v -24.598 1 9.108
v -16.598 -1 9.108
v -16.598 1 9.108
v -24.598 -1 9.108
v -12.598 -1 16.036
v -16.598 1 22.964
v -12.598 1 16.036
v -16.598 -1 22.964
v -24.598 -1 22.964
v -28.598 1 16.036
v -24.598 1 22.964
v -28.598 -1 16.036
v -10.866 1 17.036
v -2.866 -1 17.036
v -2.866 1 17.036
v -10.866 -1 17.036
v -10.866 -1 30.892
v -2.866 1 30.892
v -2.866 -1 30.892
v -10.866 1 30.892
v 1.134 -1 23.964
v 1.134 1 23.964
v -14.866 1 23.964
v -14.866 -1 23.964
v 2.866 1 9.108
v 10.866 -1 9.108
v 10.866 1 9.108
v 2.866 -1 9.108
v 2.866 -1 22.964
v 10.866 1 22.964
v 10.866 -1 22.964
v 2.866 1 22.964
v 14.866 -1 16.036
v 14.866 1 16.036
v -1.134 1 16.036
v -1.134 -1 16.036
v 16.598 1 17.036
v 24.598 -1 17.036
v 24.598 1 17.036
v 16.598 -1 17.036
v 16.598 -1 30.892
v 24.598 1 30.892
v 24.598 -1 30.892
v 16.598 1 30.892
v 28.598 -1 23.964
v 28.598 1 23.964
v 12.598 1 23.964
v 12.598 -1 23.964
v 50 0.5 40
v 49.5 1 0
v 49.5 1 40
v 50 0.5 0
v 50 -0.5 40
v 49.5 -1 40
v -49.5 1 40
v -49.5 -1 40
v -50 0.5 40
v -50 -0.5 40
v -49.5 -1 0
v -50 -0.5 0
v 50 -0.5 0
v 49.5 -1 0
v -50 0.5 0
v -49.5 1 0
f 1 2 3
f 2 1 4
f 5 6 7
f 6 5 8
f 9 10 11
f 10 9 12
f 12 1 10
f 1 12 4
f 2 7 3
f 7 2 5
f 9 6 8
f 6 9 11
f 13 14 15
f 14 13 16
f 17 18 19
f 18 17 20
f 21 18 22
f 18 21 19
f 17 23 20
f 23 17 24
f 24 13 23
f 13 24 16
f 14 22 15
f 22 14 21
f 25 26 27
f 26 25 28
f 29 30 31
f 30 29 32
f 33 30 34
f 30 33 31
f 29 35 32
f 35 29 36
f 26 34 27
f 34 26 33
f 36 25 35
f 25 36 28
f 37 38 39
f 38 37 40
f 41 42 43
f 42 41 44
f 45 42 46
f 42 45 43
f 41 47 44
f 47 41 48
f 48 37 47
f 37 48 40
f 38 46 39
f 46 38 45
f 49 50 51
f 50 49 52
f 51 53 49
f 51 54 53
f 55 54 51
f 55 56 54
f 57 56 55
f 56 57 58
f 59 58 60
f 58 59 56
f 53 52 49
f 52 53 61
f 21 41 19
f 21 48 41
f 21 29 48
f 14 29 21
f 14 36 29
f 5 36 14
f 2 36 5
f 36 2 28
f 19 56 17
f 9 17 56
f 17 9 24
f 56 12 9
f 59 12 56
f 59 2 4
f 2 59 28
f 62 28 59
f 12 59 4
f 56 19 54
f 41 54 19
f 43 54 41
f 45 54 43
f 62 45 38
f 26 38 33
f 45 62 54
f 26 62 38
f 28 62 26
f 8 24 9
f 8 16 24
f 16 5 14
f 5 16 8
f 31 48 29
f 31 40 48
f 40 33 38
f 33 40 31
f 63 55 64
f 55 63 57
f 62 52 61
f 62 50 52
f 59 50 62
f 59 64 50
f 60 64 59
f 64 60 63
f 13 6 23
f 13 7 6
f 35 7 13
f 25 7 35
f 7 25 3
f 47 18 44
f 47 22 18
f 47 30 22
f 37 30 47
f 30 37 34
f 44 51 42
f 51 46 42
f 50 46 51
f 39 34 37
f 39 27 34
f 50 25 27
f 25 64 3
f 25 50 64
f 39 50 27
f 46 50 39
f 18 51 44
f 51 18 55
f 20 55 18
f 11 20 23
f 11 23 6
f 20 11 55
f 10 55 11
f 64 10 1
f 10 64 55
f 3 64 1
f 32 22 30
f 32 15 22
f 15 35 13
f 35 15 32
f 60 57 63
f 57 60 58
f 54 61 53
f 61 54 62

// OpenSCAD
// Deutsche Version – automatisch erzeugt aus scad/wall.scad
// The Drawer Dividers V3 – Wall
// Divider walls with optional hex/circle pattern and finger grip.

/* [Bauteil] */
// Länge (mm) – der Designer sagt dir, welche Längen du brauchst
Laenge = 100; // [20:0.1:400]
// Wandhöhe (mm, 0 = automatisch aus der Verbinderhöhe)
Wand_Hoehe = 0; // [0:0.1:150]
// Wand für Aufsteck-Verbinder? (wird um die Bodendicke niedriger)
Fuer_Aufsteck = false;
// Wie viele Teile auf dem Druckbett
Anzahl = 1; // [1:1:40]
// Abstand zwischen den Teilen (mm)
Abstand = 5; // [2:1:20]
// Ausrichtung auf dem Druckbett
Ausrichtung = "standing"; // [standing:Standing (strong, fast), flat:Flat (best with patterns)]

/* [Gestaltung] */
// Muster zur Materialersparnis
Muster = "hex"; // [none:Keins, hex:Waben, circle:Kreise]
// Größe einer Zelle (Radius, mm)
Zellen_Groesse = 8; // [2:0.5:30]
// Steg zwischen zwei Zellen (mm)
Steg_Dicke = 2; // [0.5:0.1:10]
// Massiver Rand an beiden Enden (mm, -1 = automatisch: Einschubtiefe + 2)
Rand_Seite = -1; // [-1:1:60]
// Massiver Rand oben und unten (mm)
Rand_Oben_Unten = 5; // [2:0.5:20]
// Fase an den kurzen Enden zum leichteren Einstecken (mm)
Fase_Enden = 0.5; // [0:0.1:2]
// Griffmulde oben mittig (Radius in mm, 0 = aus)
Griffmulde = 0; // [0:0.5:20]

/* [System] */
// Mit einer Vorlage starten oder die Werte unten verwenden
Vorlage = "custom"; // [custom:Eigene Werte (unten), v2:V2 Standard, v1:V1 Classic (4.9 mm Wände mit Deckel)]
// Exakte Dicke deiner gedruckten Trennwände (mm)
Wand_Dicke = 2.0; // [0.8:0.1:10]
// Extra-Platz im Schlitz, damit die Wand nicht klemmt (mm, 0.2 passt meistens)
Toleranz = 0.2; // [0:0.01:1]
// Höhe der Verbinder (mm)
Hoehe = 40; // [10:1:150]
// Wie tief die Wand in einen Arm rutscht (mm)
Einschub_Tiefe = 14; // [5:1:30]
// Geschlossener Deckel wie bei V1 (mm, 0 = beidseitig offen)
Deckel_Dicke = 0; // [0:0.5:10]
// Bodendicke der Aufsteck-Verbinder (mm)
Boden_Dicke = 2; // [0.5:0.1:5]
// Luft zwischen Wandoberkante und Deckel (mm)
Spiel_Oben = 0.2; // [0:0.05:1]

/* [Hidden] */
Length = Laenge;
Wall_Height = Wand_Hoehe;
For_Slip_On = Fuer_Aufsteck;
Count = Anzahl;
Spacing = Abstand;
Orientation = Ausrichtung;
Pattern = Muster;
Cell_Size = Zellen_Groesse;
Web = Steg_Dicke;
Margin_Side = Rand_Seite;
Margin_Top_Bottom = Rand_Oben_Unten;
End_Chamfer = Fase_Enden;
Grip = Griffmulde;
Preset = Vorlage;
Wall_Thickness = Wand_Dicke;
Tolerance = Toleranz;
Height = Hoehe;
Insert_Depth = Einschub_Tiefe;
Cap_Thickness = Deckel_Dicke;
Floor_Thickness = Boden_Dicke;
Top_Gap = Spiel_Oben;
$fn = 32;

P = Preset != "custom" ? dd_preset(Preset) : dd_profile(
    wall_t = Wall_Thickness, tol = Tolerance, height = Height,
    insert = Insert_Depth, cap = Cap_Thickness, floor_t = Floor_Thickness,
    top_gap = Top_Gap);

h = Wall_Height > 0 ? Wall_Height : dd_wall_height(P, For_Slip_On);
t = dd(P, "wall_t");

module one_wall()
    dd_wall(Length, P, height = h, pattern = Pattern, cell = Cell_Size,
            web = Web, margin_side = Margin_Side, margin_tb = Margin_Top_Bottom,
            end_chamfer = End_Chamfer, grip = Grip);

if (Orientation == "flat")
    dd_grid(Count, Length + Spacing, h + Spacing) translate([0, h / 2, 0]) dd_lay_flat(t) one_wall();
else
    dd_grid(Count, Length + Spacing, t + Spacing) one_wall();

// ============================================================================
//  Library (scad/lib/drawer_divider.scad, inlined by tools/build.py)
// ============================================================================
// =============================================================================
//  The Drawer Dividers – core library (V3, unifies V1 + V2)
//  Usage:  use <lib/drawer_divider.scad>
//  All dimensions in mm. This file creates no geometry on its own.
// =============================================================================

DD_VERSION = "3.0.0";
DD_EPS = 0.01;

// =============================================================================
//  System profile
// =============================================================================
// Every part of one drawer is built from the same profile, so walls,
// connectors and rails always fit each other. A profile is a key/value list;
// read single values with dd(p, "key").

function dd_profile(
    wall_t   = 2.0,  // thickness of the printed walls
    tol      = 0.2,  // extra slot width so the wall does not bind
    height   = 40,   // connector height
    insert   = 14,   // how deep a wall slides into a connector arm
    shell    = 2.5,  // connector material left and right of the slot
    arm      = 20,   // arm length, measured from the connector centre
    fillet   = 10,   // inner fillet radius between two arms
    edge_r   = 0.6,  // rounding of the outer vertical edges
    cap      = 0,    // closed cap (V1 style); 0 = slots open on both ends
    floor_t  = 2,    // cap thickness of slip-on connectors
    lead_in  = 1,    // chamfer at the open slot end
    efc      = 0.4,  // elephant foot compensation at the bed side
    magnet_d = 5,    // magnet / rubber foot pocket, 0 = off
    magnet_h = 2,
    end_gap  = 0.3,  // gap between wall end and pocket bottom
    top_gap  = 0.2   // gap between wall top and cap (capped connectors only)
) = [
    ["wall_t", wall_t], ["tol", tol], ["height", height], ["insert", insert],
    ["shell", shell], ["arm", arm], ["fillet", fillet], ["edge_r", edge_r],
    ["cap", cap], ["floor_t", floor_t], ["lead_in", lead_in], ["efc", efc],
    ["magnet_d", magnet_d], ["magnet_h", magnet_h], ["end_gap", end_gap],
    ["top_gap", top_gap]
];

function dd(p, key) =
    let(i = search([key], p)[0])
    assert(is_num(i), str("dd(): unknown profile key '", key, "'"))
    p[i][1];

// "v2": 2 mm walls, open connectors (V2 defaults)
// "v1": 4.9 mm walls, 50 mm high, 5 mm cap – matches the original V1 STLs
function dd_preset(name) =
    name == "v1" ? dd_profile(wall_t = 4.9, tol = 0.1, height = 50, cap = 5,
                              lead_in = 0.6, efc = 0, magnet_d = 0,
                              edge_r = 0.5, top_gap = 0.1)
                 : dd_profile();

// ---- derived values (the designer uses the same formulas) -------------------
function dd_slot_w(p)       = dd(p, "wall_t") + dd(p, "tol");
function dd_arm_w(p)        = dd_slot_w(p) + 2 * dd(p, "shell");
function dd_pocket_start(p) = dd(p, "arm") - dd(p, "insert");
// distance from a connector centre to the end of a fully inserted wall
function dd_wall_inset(p)   = dd_pocket_start(p) + dd(p, "end_gap");
function dd_cap(p, slip = false) =
    slip ? max(dd(p, "cap"), dd(p, "floor_t")) : dd(p, "cap");
function dd_wall_height(p, slip = false) =
    let(c = dd_cap(p, slip))
    dd(p, "height") - (c > 0 ? c + dd(p, "top_gap") : 0);
// wall length for two connector centres `center_dist` apart
function dd_wall_length(center_dist, p, ends = 2) =
    center_dist - ends * dd_wall_inset(p);

// =============================================================================
//  Connectors
// =============================================================================
// Directions: 0 = +X, 1 = +Y, 2 = -X, 3 = -Y.
// Definition: [arms, slots, through_y, slip_on]
//   through_y: one continuous slot along Y (the wall passes straight through)
//   slip_on:   printed cap-down, then flipped and pushed onto the walls

DD_CONNECTOR_TYPES = ["cross", "tee", "corner", "straight", "end",
                      "slip_cross", "slip_tee", "slip_corner_r", "slip_corner_l"];

function dd_connector_def(type) =
    type == "cross"         ? [[1,1,1,1], [1,1,1,1], false, false] :
    type == "tee"           ? [[1,1,1,0], [1,1,1,0], false, false] :
    type == "corner"        ? [[1,1,0,0], [1,1,0,0], false, false] :
    type == "straight"      ? [[1,0,1,0], [1,0,1,0], false, false] :
    type == "end"           ? [[1,0,0,0], [1,0,0,0], false, false] :
    type == "slip_cross"    ? [[1,1,1,1], [1,1,1,1], true,  true ] :
    type == "slip_tee"      ? [[1,1,0,1], [1,1,0,1], true,  true ] :
    type == "slip_corner_r" ? [[1,1,0,0], [1,1,0,1], true,  true ] :
    type == "slip_corner_l" ? [[0,1,1,0], [0,1,1,1], true,  true ] :
    undef;

module dd_connector(type = "cross", p = dd_profile()) {
    def = dd_connector_def(type);
    assert(!is_undef(def), str("dd_connector(): unknown type '", type, "'"));
    dd_connector_custom(arms = def[0], slots = def[1], through_y = def[2],
                        cap = dd_cap(p, def[3]), p = p);
}

// Build any connector from an arm/slot pattern.
module dd_connector_custom(arms = [1,1,1,1], slots = undef, through_y = false,
                           cap = 0, p = dd_profile()) {
    sl  = is_undef(slots) ? arms : slots;
    h   = dd(p, "height");
    aw  = dd_arm_w(p);
    arm = dd(p, "arm");
    ps  = dd_pocket_start(p);
    md  = dd(p, "magnet_d");
    z0  = cap > 0 ? cap : -1;   // slots start above the cap

    difference() {
        linear_extrude(h) dd_connector_outline(arms, p);

        for (i = [0:3]) if (sl[i] && !(through_y && i == 3))
            rotate(90 * i)
                dd_slot_cut(x0 = (through_y && i == 1) ? -(arm + 1) : ps,
                            x1 = arm + 1, z0 = z0, p = p);

        // magnet pocket on the side that faces the drawer floor in use
        if (!through_y && md > 0 && md <= min(aw, 2 * ps) - 1) {
            mh = dd(p, "magnet_h");
            if (cap > 0) translate([0, 0, h - mh]) cylinder(d = md, h = mh + 1, $fn = 48);
            else translate([0, 0, -DD_EPS]) cylinder(d = md, h = mh + DD_EPS, $fn = 48);
        }
    }
}

module dd_connector_outline(arms, p) {
    aw = dd_arm_w(p);
    dd_round_convex(dd(p, "edge_r"))
    dd_round_concave(dd(p, "fillet"))
    union() {
        square(aw, center = true);
        for (i = [0:3]) if (arms[i])
            rotate(90 * i) translate([0, -aw / 2]) square([dd(p, "arm"), aw]);
    }
}

// one slot along +X from x0 to x1, open at the top
module dd_slot_cut(x0, x1, z0, p) {
    h    = dd(p, "height");
    sw   = dd_slot_w(p);
    li   = dd(p, "lead_in");
    efc  = dd(p, "efc");
    len  = x1 - x0;

    translate([x0, -sw / 2, z0]) cube([len, sw, h - z0 + 1]);

    if (li > 0) hull() {
        translate([x0, -sw / 2, h - li]) cube([len, sw, DD_EPS]);
        translate([x0, -sw / 2 - li, h]) cube([len, sw + 2 * li, 1]);
    }
    // only where the slot touches the print bed
    if (z0 < 0 && efc > 0) hull() {
        translate([x0, -sw / 2 - efc, -1]) cube([len, sw + 2 * efc, 1]);
        translate([x0, -sw / 2, efc]) cube([len, sw, DD_EPS]);
    }
}

// footprint size, used to space copies on the plate
function dd_connector_size(p) = 2 * dd(p, "arm");

// =============================================================================
//  Walls
// =============================================================================
// Built standing: X = length, Y = thickness (centred), Z = height.

module dd_wall(length, p = dd_profile(), height = undef, pattern = "none",
               cell = 8, web = 2, margin_side = -1, margin_tb = 5,
               end_chamfer = 0.5, grip = 0) {
    h  = is_undef(height) ? dd_wall_height(p) : height;
    t  = dd(p, "wall_t");
    // keep the pattern out of the connector pockets
    ms = margin_side < 0 ? dd(p, "insert") + 2 : margin_side;

    difference() {
        linear_extrude(h) dd_wall_2d(length, t, end_chamfer);
        dd_wall_pattern(length, t, h, pattern, cell, web, ms,
                        margin_tb, margin_tb + grip);
        if (grip > 0)
            translate([0, 0, h]) rotate([90, 0, 0])
                cylinder(r = grip, h = t + 2, center = true, $fn = 48);
    }
}

module dd_wall_2d(l, t, c) {
    ce = min(c, t / 2 - 0.01);
    if (ce > 0)
        polygon([
            [-l/2 + ce, -t/2], [ l/2 - ce, -t/2], [ l/2, -t/2 + ce], [ l/2,  t/2 - ce],
            [ l/2 - ce,  t/2], [-l/2 + ce,  t/2], [-l/2,  t/2 - ce], [-l/2, -t/2 + ce]
        ]);
    else
        square([l, t], center = true);
}

// Hex or circle pattern with a constant web between the holes.
module dd_wall_pattern(l, t, h, pattern, cell, web, ms, mb, mt) {
    if (pattern == "hex" || pattern == "circle") {
        hex   = pattern == "hex";
        D     = hex ? cell * sqrt(3) + web : 2 * cell + web;  // vertical pitch
        ext_x = cell;
        ext_z = hex ? cell * sqrt(3) / 2 : cell;
        max_w = l - 2 * ms - 2 * ext_x;
        max_h = h - mb - mt - 2 * ext_z;
        stagger = max_h >= D / 2;
        sx    = stagger ? D * sqrt(3) / 2 : 2 * cell + web;
        cols  = max_w >= 0 ? floor(max_w / sx) + 1 : 0;
        st    = stagger && cols > 1;
        rows  = max_h >= 0 ? floor((max_h - (st ? D / 2 : 0)) / D) + 1 : 0;

        if (cols > 0 && rows > 0) {
            pw = (cols - 1) * sx;
            ph = (rows - 1) * D + (st ? D / 2 : 0);
            z0 = mb + ext_z + (max_h - ph) / 2;
            for (c = [0 : cols - 1], r = [0 : rows - 1])
                translate([-pw / 2 + c * sx, 0, z0 + r * D + (st && c % 2 == 1 ? D / 2 : 0)])
                    rotate([90, 0, 0])
                        cylinder(r = cell, h = t + 2, center = true, $fn = hex ? 6 : 32);
        }
    }
}

// =============================================================================
//  Rails ("Raster Wall") – glued or screwed to the drawer side
// =============================================================================
// Built flat: X = length, Y = width (= height in the drawer), Z = thickness.
// Teeth form slots of the system slot width. teeth_offset = position of the
// first tooth from x = 0; -1 centres the pattern. Joined rails use explicit
// offsets so the slot pitch continues across the joint.

function dd_rail_pitch(p, tooth_t = 2) = tooth_t + dd_slot_w(p);

function dd_rail_center_offset(length, p, tooth_t = 2) =
    let(sw = dd_slot_w(p), pitch = tooth_t + sw,
        n = max(1, floor((length + sw) / pitch)),
        used = n * tooth_t + (n - 1) * sw)
    (length - used) / 2;

module dd_rail(length, width, p = dd_profile(), plate = 2.5, tooth_t = 2,
               tooth_h = 6, tooth_chamfer = 0.6, tooth_fillet = 0.5,
               teeth_offset = -1, teeth = true, tongue = true, socket = true,
               tongue_len = 2, tongue_w = -1, tongue_chamfer = 1,
               tol_w = 1, tol_d = 0.5, tol_z = 0.1,
               screws = 3, screw_d = 3.2, head_d = 6.5) {
    sw    = dd_slot_w(p);
    pitch = tooth_t + sw;
    x0    = teeth_offset >= 0 ? teeth_offset : dd_rail_center_offset(length, p, tooth_t);
    n     = floor((length - x0 - tooth_t) / pitch) + 1;
    tw    = tongue_w < 0 ? max(width - 12, width * 0.6) : min(tongue_w, width - 4);
    zt    = plate / 2 - tol_z / 2;
    zs    = plate / 2 + tol_z / 2;

    difference() {
        union() {
            cube([length, width, plate]);
            if (tongue)
                translate([length, (width - tw) / 2, 0]) linear_extrude(zt)
                    polygon([[0, 0], [tongue_len, tongue_chamfer],
                             [tongue_len, tw - tongue_chamfer], [0, tw]]);
            if (teeth && n > 0)
                for (i = [0 : n - 1])
                    translate([x0 + i * pitch, 0, plate - DD_EPS])
                        dd_rail_tooth(width, tooth_t, tooth_h, tooth_chamfer, tooth_fillet);
        }
        if (socket) {
            bw = tw + 2 * tol_w;
            translate([-DD_EPS, (width - bw) / 2, -DD_EPS])
                cube([tongue_len + tol_d + DD_EPS, bw, zs + DD_EPS]);
        }
        // screws sit in the middle of a slot so they damage as few teeth as possible
        if (screws > 0) for (s = [1 : screws]) {
            k  = round((length * s / (screws + 1) - x0 - tooth_t - sw / 2) / pitch);
            xs = x0 + tooth_t + sw / 2 + k * pitch;
            cs = min(1.5, plate - 0.4);
            translate([xs, width / 2, 0]) {
                translate([0, 0, -1]) cylinder(d = screw_d, h = plate + 2, $fn = 32);
                translate([0, 0, plate - cs]) cylinder(d1 = screw_d, d2 = head_d, h = cs + DD_EPS, $fn = 32);
                translate([0, 0, plate]) cylinder(d = head_d + 0.5, h = tooth_h + 1, $fn = 32);
            }
        }
    }
}

// One tooth across the full rail width, with lead-in chamfer and base fillets.
// Keep tooth_fillet <= the wall end chamfer so walls still reach the plate.
module dd_rail_tooth(width, tt, th, ch, fr) {
    c = max(0, min(ch, tt / 2 - 0.2, th - 0.5));
    translate([0, width, 0]) rotate([90, 0, 0]) linear_extrude(width) {
        polygon([[0, 0], [tt, 0], [tt, th - c], [tt - c, th], [c, th], [0, th - c]]);
        if (fr > 0) {
            translate([tt, 0]) dd_fillet_2d(fr);
            mirror([1, 0]) dd_fillet_2d(fr);
        }
    }
}

// =============================================================================
//  Tolerance test
// =============================================================================
// A bar with one slot per tolerance (value engraved next to it) plus a short
// test wall. Print both, find the slot that fits best, use that tolerance.

module dd_tolerance_test(p = dd_profile(), tols = [0.1, 0.15, 0.2, 0.25, 0.3],
                         height = 12, depth = 20, land = 8, base = 1.2,
                         coupon = true) {
    t = dd(p, "wall_t");
    n = len(tols);
    function x_at(i) = land * (i + 1) + i * t + dd_sum(tols, i);
    L = x_at(n);

    difference() {
        cube([L, depth, height]);
        for (i = [0 : n - 1]) {
            translate([x_at(i), -1, base]) cube([t + tols[i], depth + 2, height]);
            translate([x_at(i) - land / 2, depth / 2, height - 0.6])
                linear_extrude(1) rotate(90)
                    text(str(tols[i]), size = min(3.2, land * 0.42),
                         halign = "center", valign = "center");
        }
    }
    if (coupon)
        translate([L / 2, depth + 8, 0])
            dd_wall(30, p, height = height + 4, end_chamfer = 0.3);
}

// =============================================================================
//  Helpers
// =============================================================================

function dd_sum(v, n) = n <= 0 ? 0 : v[n - 1] + dd_sum(v, n - 1);

module dd_round_concave(r) { if (r > 0) offset(r = -r) offset(r = r) children(); else children(); }
module dd_round_convex(r)  { if (r > 0) offset(r = r) offset(delta = -r) children(); else children(); }

module dd_fillet_2d(r) {
    difference() {
        square([r, r]);
        translate([r, r]) circle(r = r, $fn = 24);
    }
}

// Arrange `count` copies of the child in rows that fit max_w, centred on the origin.
module dd_grid(count, pitch_x, pitch_y, max_w = 240) {
    cols = max(1, min(count, floor((max_w + DD_EPS) / pitch_x)));
    rows = ceil(count / cols);
    for (i = [0 : count - 1])
        translate([((i % cols) - (cols - 1) / 2) * pitch_x,
                   (floor(i / cols) - (rows - 1) / 2) * pitch_y, 0])
            children();
}

// Lay a standing wall flat on the bed.
module dd_lay_flat(t) { translate([0, 0, t / 2]) rotate([90, 0, 0]) children(); }
